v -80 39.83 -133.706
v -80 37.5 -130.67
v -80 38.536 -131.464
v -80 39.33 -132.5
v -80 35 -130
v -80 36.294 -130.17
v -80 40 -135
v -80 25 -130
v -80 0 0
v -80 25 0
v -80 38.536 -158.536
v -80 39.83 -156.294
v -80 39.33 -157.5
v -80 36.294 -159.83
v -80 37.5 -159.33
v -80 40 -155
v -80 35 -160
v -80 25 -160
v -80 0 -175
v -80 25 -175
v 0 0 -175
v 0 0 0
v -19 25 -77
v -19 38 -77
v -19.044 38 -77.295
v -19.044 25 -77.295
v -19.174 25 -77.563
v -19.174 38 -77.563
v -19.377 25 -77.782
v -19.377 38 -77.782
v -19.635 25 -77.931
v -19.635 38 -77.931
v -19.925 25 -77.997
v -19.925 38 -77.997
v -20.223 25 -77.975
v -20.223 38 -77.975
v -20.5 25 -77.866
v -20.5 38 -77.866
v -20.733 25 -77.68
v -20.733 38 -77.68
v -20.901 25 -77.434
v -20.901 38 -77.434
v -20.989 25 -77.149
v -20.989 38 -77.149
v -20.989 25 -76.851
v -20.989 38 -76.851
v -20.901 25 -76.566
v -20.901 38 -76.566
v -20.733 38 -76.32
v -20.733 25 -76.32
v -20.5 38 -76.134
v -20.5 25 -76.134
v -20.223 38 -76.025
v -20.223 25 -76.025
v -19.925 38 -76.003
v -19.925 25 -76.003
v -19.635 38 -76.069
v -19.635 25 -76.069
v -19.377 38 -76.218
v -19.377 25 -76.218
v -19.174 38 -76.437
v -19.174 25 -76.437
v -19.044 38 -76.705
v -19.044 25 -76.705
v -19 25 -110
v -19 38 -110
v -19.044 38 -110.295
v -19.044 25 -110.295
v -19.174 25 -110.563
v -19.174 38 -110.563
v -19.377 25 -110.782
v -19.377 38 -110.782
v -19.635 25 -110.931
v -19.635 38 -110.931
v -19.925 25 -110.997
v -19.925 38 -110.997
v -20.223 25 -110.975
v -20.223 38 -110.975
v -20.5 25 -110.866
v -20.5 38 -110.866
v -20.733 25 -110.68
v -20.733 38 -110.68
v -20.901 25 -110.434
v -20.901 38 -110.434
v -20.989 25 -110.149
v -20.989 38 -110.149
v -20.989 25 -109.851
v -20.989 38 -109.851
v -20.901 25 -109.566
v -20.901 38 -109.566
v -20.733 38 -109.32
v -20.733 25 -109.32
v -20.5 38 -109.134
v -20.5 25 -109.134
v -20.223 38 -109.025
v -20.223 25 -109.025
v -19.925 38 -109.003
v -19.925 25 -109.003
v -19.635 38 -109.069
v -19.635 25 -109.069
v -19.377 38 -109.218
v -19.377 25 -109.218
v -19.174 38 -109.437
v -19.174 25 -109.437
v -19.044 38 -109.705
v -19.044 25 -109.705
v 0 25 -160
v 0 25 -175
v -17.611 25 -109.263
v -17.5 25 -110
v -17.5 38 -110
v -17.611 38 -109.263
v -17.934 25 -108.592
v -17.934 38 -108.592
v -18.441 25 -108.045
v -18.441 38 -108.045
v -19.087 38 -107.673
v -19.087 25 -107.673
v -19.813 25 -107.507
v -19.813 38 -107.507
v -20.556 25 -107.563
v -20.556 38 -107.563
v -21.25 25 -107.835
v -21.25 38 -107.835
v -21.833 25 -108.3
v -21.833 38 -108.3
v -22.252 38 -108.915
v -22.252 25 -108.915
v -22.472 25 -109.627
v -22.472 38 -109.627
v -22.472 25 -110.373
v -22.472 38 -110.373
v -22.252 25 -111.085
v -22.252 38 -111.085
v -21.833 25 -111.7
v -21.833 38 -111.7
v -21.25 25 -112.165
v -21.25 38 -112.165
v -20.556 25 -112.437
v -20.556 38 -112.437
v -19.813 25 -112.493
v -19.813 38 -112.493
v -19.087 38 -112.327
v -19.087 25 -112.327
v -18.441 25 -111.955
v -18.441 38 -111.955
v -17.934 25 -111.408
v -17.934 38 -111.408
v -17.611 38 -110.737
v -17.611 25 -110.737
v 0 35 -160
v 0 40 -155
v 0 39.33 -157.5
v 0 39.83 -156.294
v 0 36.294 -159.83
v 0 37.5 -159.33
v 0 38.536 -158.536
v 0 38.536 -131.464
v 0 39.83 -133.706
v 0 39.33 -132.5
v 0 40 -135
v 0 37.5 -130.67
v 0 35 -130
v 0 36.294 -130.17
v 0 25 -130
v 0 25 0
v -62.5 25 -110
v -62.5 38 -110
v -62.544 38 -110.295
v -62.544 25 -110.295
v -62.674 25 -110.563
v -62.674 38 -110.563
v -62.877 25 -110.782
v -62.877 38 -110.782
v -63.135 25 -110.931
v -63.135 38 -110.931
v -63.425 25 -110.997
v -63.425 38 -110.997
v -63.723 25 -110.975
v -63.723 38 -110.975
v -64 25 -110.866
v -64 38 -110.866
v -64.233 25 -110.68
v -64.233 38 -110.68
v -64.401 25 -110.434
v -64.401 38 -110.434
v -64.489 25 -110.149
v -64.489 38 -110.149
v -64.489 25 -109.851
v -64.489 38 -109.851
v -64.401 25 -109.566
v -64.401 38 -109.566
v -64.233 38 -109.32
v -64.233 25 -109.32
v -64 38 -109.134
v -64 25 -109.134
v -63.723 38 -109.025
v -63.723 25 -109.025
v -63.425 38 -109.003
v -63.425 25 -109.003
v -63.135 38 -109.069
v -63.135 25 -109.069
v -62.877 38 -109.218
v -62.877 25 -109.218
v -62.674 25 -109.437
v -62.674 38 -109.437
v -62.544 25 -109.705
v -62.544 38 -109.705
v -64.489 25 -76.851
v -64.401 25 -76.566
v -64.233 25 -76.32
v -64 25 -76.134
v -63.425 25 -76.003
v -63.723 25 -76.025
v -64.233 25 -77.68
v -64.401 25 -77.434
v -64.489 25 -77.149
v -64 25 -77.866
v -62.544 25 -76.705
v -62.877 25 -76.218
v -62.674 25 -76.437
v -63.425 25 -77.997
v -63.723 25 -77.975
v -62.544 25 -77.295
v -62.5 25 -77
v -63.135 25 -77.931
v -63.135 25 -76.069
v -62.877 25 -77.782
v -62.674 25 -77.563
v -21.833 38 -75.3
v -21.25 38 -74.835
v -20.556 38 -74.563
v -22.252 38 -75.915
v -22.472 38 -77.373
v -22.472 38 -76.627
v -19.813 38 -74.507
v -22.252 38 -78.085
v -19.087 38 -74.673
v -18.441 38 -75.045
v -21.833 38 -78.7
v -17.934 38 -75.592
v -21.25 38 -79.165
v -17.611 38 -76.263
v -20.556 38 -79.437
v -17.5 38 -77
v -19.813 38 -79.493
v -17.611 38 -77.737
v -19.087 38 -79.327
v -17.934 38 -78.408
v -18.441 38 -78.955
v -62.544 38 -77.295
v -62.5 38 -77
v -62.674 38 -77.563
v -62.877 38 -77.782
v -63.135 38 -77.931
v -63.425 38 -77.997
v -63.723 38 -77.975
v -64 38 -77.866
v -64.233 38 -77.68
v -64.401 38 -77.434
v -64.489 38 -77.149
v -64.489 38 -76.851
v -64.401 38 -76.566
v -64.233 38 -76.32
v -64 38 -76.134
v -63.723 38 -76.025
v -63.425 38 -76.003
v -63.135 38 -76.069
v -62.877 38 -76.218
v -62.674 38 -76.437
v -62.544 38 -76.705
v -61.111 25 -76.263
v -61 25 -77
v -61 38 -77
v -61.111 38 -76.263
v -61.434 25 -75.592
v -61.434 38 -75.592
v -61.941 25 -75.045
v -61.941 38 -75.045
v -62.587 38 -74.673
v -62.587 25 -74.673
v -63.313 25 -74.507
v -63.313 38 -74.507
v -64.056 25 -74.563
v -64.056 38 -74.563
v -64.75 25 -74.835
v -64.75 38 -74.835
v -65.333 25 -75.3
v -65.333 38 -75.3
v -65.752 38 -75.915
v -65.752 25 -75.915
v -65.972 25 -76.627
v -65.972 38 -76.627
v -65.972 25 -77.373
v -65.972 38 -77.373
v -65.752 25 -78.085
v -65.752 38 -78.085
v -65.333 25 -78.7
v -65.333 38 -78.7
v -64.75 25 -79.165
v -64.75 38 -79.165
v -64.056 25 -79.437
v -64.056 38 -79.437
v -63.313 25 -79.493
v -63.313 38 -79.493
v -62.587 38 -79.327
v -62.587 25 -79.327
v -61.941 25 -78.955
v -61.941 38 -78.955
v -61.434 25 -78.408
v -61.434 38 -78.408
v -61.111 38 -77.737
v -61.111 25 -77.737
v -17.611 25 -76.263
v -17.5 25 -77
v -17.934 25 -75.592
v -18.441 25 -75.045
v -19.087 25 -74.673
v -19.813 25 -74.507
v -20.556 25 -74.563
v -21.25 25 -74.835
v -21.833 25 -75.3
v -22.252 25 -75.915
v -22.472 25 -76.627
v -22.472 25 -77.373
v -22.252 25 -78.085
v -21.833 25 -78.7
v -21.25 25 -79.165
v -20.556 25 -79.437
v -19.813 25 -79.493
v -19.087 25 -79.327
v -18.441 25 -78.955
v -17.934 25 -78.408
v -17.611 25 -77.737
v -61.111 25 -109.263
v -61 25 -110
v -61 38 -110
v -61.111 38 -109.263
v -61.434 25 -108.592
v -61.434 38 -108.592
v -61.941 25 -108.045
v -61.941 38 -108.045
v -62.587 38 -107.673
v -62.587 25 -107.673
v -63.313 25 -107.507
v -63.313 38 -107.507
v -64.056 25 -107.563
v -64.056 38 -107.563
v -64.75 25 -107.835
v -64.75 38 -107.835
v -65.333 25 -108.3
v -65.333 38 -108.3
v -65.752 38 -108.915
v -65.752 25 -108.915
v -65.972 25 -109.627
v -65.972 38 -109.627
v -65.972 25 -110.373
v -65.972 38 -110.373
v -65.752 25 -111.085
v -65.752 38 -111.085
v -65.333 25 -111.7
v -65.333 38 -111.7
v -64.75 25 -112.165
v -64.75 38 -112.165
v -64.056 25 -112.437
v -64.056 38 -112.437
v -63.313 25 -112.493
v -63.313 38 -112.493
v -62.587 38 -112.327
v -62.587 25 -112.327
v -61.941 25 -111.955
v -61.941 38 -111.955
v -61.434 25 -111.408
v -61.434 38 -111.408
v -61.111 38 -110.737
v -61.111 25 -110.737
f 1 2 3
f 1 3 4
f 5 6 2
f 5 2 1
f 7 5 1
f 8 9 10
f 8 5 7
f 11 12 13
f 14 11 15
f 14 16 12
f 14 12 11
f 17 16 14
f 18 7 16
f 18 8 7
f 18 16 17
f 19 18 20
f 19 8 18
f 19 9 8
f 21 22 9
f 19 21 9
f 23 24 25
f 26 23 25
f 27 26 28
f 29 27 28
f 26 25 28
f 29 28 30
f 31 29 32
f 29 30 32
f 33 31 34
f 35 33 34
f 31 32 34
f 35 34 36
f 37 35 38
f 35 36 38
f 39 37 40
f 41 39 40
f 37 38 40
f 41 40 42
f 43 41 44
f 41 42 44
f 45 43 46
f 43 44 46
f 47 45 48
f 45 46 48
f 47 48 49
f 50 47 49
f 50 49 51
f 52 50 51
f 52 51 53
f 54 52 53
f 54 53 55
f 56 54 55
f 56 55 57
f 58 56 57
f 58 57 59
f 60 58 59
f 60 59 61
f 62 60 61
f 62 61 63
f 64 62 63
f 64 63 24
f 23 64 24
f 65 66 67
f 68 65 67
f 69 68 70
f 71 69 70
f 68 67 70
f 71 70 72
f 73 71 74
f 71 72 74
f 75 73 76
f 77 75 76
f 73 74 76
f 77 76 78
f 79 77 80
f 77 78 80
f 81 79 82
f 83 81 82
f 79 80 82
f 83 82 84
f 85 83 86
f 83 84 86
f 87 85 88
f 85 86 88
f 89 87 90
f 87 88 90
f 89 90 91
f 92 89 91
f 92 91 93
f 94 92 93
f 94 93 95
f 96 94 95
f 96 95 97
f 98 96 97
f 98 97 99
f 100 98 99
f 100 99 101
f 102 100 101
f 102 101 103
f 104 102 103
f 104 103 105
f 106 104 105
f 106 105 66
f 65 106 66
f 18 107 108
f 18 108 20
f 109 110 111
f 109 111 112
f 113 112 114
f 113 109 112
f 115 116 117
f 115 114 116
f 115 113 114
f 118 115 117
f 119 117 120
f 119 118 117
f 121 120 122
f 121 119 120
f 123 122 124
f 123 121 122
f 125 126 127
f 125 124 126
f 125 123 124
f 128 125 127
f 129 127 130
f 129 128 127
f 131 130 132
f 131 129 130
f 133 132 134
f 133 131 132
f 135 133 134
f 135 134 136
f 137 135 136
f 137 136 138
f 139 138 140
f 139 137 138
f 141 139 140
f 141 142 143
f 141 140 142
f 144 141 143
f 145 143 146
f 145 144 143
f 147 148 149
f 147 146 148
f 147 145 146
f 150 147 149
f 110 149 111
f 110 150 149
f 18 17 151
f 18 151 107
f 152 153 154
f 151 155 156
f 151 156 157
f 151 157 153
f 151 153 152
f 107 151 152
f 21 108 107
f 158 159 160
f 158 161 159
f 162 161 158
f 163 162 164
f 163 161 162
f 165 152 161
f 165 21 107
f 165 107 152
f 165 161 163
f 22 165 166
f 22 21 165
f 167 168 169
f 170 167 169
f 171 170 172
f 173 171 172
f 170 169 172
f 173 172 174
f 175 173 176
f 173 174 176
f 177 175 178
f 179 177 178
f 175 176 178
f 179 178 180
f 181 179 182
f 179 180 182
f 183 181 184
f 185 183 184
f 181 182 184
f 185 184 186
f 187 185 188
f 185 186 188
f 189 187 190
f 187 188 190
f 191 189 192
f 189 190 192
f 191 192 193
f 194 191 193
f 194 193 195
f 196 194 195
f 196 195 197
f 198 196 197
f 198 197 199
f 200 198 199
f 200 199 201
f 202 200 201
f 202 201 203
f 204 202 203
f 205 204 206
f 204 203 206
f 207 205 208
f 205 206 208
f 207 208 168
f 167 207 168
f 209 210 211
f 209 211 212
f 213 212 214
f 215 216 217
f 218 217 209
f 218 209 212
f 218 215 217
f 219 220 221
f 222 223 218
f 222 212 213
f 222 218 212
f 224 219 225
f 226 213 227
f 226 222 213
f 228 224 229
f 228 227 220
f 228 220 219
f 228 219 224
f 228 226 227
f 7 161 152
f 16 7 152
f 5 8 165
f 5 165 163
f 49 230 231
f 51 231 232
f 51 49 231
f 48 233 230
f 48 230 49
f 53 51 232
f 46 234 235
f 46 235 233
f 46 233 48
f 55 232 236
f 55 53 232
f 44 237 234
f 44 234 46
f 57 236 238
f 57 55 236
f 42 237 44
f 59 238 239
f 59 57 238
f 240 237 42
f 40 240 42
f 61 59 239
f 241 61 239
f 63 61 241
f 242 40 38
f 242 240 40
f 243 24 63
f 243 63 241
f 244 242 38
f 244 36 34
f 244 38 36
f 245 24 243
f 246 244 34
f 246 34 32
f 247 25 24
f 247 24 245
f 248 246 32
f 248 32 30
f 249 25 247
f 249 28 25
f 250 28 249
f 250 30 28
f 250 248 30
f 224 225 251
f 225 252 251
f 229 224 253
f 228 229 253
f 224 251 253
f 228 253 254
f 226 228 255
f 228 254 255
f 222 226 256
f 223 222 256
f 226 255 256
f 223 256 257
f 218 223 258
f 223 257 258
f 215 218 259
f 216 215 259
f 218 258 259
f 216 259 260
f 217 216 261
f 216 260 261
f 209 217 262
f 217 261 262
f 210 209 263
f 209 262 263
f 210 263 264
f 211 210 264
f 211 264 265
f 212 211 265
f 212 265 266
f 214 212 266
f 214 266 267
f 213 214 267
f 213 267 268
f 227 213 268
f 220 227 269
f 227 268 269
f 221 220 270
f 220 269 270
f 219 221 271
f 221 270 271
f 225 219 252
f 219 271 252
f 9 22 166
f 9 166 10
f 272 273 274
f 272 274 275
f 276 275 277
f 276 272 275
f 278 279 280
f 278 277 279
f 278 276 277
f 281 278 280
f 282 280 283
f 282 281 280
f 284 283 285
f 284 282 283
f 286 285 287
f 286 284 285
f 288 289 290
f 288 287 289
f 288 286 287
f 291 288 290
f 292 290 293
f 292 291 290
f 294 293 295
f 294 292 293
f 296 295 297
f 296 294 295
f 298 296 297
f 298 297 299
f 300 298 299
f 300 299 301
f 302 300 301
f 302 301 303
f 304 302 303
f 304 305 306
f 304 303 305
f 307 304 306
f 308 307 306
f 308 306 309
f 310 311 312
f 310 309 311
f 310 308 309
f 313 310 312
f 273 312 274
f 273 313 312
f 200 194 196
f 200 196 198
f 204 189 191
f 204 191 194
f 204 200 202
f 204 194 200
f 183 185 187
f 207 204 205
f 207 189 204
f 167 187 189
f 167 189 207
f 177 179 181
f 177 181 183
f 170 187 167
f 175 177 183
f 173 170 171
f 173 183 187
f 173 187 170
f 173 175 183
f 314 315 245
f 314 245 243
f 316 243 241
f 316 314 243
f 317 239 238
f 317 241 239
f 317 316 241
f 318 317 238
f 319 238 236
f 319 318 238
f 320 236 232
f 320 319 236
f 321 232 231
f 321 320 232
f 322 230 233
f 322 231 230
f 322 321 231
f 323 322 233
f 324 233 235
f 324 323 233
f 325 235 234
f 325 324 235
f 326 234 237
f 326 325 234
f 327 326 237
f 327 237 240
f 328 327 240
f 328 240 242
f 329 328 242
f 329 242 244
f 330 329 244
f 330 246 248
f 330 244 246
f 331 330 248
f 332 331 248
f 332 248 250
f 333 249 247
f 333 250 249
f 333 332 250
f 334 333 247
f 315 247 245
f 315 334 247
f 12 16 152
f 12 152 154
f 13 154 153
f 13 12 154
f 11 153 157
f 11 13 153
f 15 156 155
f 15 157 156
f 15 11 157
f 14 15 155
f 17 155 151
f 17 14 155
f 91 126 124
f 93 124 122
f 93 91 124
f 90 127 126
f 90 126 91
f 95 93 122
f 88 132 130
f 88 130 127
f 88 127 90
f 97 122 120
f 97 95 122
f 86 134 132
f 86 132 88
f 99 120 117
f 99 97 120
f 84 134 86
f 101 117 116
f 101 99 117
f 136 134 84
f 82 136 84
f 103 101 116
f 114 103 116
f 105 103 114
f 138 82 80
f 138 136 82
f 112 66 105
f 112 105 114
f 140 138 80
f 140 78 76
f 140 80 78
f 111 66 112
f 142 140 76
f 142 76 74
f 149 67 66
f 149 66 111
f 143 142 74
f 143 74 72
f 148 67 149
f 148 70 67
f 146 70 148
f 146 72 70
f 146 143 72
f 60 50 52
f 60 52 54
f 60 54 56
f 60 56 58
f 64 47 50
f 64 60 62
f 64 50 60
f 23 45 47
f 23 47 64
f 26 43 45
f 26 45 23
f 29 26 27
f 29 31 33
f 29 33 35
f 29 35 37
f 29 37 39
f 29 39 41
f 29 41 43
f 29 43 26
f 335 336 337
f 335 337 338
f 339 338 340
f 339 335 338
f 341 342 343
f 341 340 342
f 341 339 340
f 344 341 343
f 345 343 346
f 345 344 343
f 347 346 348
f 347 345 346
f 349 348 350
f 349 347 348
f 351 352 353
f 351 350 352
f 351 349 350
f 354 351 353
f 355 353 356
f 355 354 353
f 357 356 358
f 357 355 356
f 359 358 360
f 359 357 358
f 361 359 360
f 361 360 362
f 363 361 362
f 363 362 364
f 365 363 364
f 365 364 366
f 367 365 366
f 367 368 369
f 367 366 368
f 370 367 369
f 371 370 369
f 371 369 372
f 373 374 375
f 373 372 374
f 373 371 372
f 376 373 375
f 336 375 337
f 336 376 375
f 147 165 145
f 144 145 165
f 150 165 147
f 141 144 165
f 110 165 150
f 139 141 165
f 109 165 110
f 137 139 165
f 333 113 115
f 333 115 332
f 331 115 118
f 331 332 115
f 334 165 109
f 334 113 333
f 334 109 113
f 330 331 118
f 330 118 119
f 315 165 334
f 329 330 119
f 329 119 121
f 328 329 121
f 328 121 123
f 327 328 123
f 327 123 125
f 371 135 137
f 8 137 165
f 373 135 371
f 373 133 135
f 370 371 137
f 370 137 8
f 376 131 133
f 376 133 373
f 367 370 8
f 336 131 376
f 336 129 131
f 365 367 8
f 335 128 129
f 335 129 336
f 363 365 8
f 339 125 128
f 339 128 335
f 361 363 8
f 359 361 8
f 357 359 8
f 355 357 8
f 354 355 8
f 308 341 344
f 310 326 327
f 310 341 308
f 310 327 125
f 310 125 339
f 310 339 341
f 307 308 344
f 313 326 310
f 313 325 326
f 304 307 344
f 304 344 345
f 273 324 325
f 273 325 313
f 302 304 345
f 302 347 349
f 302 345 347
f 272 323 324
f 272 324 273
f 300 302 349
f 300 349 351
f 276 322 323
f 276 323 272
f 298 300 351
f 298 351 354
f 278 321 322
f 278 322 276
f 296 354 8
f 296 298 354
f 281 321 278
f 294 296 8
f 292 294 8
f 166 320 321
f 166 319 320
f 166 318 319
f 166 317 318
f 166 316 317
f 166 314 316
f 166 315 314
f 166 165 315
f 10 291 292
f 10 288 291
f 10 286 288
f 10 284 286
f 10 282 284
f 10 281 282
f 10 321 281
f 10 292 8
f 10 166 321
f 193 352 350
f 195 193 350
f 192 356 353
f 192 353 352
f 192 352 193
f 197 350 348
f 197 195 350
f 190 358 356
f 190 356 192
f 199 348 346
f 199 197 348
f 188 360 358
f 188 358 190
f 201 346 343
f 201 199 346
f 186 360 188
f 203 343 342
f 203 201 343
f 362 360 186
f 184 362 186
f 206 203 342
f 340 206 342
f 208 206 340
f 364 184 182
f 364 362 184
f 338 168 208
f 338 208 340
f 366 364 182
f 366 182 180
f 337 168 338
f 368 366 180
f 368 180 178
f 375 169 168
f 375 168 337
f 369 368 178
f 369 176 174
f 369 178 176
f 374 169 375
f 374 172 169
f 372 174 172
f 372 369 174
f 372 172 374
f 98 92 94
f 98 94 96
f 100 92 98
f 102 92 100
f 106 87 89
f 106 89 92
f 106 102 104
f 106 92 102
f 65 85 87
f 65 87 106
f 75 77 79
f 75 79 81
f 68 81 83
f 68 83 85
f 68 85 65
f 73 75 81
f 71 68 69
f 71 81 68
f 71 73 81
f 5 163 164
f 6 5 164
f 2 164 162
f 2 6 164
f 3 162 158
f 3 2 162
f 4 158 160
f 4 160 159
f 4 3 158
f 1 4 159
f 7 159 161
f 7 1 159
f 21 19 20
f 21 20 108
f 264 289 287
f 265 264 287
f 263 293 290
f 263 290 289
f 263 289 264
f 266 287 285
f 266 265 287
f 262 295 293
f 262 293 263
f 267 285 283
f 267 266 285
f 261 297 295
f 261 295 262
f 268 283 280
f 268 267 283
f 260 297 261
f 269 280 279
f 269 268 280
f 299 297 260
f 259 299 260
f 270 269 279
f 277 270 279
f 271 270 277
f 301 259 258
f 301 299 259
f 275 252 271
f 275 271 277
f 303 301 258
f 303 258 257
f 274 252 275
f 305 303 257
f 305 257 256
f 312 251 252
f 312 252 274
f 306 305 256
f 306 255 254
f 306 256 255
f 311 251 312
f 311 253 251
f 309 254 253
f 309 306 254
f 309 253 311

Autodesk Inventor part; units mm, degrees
ref_plane "YZ Plane" through (0, 0, 0) normal (1, 0, 0) x (0, 1, 0)
ref_plane "XZ Plane" through (0, 0, 0) normal (0, 1, 0) x (-1, 0, 0)
ref_plane "XY Plane" through (0, 0, 0) normal (0, 0, 1) x (1, 0, 0)
sketch "Sketch1" plane through (0, 0, 0) normal (0, 1, 0) x (-1, 0, 0)
  line L0 (0, 0) -> (80, 0)
  line L1 (80, 0) -> (80, -175)
  line L2 (80, -175) -> (0, -175)
  line L3 (0, -175) -> (0, 0)
  dimension "d0" = 80
  dimension "d1" = 175
extrude "Extrusion1" add sketch "Sketch1" along normal blind 25
sketch "Sketch2" plane through (0, 25, 0) normal (0, 1, 0) x (1, 0, 0)
  point P0 (0, 0)
sketch "Sketch3" plane through (0, 0, 0) normal (1, 0, 0) x (0, 0, -1)
  line L0 (175, 25) -> (0, 25) projected
  line L1 (160, 25) -> (130, 25)
  line L2 (130, 25) -> (130, 40)
  line L3 (130, 40) -> (160, 40)
  line L4 (160, 40) -> (160, 25)
  line L5 (175, 0) -> (175, 25) projected
  point P0 (0, 0)
  dimension "d4" = 15
  dimension "d5" = 15
  dimension "d6" = 30
extrude "Extrusion2" add sketch "Sketch3" against normal blind 80
fillet "Fillet1" radius 5 2 edges at (-40, 40, -130) (-40, 40, -160)
sketch "Sketch4" plane through (0, 25, 0) normal (0, 1, 0) x (1, 0, 0)
  circle A0 centre (-63.5, 110) radius 2.5
  circle A1 centre (-20, 110) radius 2.5
  circle A2 centre (-20, 77) radius 2.5
  circle A3 centre (-63.5, 77) radius 2.5
  line L0 (0, 0) -> (0, 130) projected
  line L1 (-80, 130) -> (0, 130) projected
  dimension "d10" = 5
  dimension "d11" = 5
  dimension "d12" = 5
  dimension "d13" = 5
  dimension "d14" = 20
  dimension "d15" = 20
  dimension "d16" = 43.5
  dimension "d17" = 43.5
  dimension "d18" = 20
  dimension "d19" = 20
  dimension "d20" = 33
  dimension "d21" = 33
extrude "Extrusion3" add sketch "Sketch4" along normal blind 13
sketch "Sketch5" plane through (-20, 38, -77) normal (0, 1, 0) x (1, 0, 0)
  circle A0 centre (-43.5, 0) radius 2.5 projected
  circle A1 centre (-43.5, 0) radius 1
  circle A2 centre (-43.5, 33) radius 2.5 projected
  circle A3 centre (-43.5, 33) radius 1
  circle A4 centre (0, 33) radius 2.5 projected
  circle A5 centre (0, 33) radius 1
  circle A6 centre (0, 0) radius 2.5 projected
  circle A7 centre (0, 0) radius 1
  point P0 (20, -77)
  dimension "d24" = 2
  dimension "d25" = 2
  dimension "d26" = 2
  dimension "d27" = 2
extrude "Extrusion4" cut sketch "Sketch5" against normal blind 13 contours A1 | A3 | A5 | A7
properties part number "CarApproximation"
